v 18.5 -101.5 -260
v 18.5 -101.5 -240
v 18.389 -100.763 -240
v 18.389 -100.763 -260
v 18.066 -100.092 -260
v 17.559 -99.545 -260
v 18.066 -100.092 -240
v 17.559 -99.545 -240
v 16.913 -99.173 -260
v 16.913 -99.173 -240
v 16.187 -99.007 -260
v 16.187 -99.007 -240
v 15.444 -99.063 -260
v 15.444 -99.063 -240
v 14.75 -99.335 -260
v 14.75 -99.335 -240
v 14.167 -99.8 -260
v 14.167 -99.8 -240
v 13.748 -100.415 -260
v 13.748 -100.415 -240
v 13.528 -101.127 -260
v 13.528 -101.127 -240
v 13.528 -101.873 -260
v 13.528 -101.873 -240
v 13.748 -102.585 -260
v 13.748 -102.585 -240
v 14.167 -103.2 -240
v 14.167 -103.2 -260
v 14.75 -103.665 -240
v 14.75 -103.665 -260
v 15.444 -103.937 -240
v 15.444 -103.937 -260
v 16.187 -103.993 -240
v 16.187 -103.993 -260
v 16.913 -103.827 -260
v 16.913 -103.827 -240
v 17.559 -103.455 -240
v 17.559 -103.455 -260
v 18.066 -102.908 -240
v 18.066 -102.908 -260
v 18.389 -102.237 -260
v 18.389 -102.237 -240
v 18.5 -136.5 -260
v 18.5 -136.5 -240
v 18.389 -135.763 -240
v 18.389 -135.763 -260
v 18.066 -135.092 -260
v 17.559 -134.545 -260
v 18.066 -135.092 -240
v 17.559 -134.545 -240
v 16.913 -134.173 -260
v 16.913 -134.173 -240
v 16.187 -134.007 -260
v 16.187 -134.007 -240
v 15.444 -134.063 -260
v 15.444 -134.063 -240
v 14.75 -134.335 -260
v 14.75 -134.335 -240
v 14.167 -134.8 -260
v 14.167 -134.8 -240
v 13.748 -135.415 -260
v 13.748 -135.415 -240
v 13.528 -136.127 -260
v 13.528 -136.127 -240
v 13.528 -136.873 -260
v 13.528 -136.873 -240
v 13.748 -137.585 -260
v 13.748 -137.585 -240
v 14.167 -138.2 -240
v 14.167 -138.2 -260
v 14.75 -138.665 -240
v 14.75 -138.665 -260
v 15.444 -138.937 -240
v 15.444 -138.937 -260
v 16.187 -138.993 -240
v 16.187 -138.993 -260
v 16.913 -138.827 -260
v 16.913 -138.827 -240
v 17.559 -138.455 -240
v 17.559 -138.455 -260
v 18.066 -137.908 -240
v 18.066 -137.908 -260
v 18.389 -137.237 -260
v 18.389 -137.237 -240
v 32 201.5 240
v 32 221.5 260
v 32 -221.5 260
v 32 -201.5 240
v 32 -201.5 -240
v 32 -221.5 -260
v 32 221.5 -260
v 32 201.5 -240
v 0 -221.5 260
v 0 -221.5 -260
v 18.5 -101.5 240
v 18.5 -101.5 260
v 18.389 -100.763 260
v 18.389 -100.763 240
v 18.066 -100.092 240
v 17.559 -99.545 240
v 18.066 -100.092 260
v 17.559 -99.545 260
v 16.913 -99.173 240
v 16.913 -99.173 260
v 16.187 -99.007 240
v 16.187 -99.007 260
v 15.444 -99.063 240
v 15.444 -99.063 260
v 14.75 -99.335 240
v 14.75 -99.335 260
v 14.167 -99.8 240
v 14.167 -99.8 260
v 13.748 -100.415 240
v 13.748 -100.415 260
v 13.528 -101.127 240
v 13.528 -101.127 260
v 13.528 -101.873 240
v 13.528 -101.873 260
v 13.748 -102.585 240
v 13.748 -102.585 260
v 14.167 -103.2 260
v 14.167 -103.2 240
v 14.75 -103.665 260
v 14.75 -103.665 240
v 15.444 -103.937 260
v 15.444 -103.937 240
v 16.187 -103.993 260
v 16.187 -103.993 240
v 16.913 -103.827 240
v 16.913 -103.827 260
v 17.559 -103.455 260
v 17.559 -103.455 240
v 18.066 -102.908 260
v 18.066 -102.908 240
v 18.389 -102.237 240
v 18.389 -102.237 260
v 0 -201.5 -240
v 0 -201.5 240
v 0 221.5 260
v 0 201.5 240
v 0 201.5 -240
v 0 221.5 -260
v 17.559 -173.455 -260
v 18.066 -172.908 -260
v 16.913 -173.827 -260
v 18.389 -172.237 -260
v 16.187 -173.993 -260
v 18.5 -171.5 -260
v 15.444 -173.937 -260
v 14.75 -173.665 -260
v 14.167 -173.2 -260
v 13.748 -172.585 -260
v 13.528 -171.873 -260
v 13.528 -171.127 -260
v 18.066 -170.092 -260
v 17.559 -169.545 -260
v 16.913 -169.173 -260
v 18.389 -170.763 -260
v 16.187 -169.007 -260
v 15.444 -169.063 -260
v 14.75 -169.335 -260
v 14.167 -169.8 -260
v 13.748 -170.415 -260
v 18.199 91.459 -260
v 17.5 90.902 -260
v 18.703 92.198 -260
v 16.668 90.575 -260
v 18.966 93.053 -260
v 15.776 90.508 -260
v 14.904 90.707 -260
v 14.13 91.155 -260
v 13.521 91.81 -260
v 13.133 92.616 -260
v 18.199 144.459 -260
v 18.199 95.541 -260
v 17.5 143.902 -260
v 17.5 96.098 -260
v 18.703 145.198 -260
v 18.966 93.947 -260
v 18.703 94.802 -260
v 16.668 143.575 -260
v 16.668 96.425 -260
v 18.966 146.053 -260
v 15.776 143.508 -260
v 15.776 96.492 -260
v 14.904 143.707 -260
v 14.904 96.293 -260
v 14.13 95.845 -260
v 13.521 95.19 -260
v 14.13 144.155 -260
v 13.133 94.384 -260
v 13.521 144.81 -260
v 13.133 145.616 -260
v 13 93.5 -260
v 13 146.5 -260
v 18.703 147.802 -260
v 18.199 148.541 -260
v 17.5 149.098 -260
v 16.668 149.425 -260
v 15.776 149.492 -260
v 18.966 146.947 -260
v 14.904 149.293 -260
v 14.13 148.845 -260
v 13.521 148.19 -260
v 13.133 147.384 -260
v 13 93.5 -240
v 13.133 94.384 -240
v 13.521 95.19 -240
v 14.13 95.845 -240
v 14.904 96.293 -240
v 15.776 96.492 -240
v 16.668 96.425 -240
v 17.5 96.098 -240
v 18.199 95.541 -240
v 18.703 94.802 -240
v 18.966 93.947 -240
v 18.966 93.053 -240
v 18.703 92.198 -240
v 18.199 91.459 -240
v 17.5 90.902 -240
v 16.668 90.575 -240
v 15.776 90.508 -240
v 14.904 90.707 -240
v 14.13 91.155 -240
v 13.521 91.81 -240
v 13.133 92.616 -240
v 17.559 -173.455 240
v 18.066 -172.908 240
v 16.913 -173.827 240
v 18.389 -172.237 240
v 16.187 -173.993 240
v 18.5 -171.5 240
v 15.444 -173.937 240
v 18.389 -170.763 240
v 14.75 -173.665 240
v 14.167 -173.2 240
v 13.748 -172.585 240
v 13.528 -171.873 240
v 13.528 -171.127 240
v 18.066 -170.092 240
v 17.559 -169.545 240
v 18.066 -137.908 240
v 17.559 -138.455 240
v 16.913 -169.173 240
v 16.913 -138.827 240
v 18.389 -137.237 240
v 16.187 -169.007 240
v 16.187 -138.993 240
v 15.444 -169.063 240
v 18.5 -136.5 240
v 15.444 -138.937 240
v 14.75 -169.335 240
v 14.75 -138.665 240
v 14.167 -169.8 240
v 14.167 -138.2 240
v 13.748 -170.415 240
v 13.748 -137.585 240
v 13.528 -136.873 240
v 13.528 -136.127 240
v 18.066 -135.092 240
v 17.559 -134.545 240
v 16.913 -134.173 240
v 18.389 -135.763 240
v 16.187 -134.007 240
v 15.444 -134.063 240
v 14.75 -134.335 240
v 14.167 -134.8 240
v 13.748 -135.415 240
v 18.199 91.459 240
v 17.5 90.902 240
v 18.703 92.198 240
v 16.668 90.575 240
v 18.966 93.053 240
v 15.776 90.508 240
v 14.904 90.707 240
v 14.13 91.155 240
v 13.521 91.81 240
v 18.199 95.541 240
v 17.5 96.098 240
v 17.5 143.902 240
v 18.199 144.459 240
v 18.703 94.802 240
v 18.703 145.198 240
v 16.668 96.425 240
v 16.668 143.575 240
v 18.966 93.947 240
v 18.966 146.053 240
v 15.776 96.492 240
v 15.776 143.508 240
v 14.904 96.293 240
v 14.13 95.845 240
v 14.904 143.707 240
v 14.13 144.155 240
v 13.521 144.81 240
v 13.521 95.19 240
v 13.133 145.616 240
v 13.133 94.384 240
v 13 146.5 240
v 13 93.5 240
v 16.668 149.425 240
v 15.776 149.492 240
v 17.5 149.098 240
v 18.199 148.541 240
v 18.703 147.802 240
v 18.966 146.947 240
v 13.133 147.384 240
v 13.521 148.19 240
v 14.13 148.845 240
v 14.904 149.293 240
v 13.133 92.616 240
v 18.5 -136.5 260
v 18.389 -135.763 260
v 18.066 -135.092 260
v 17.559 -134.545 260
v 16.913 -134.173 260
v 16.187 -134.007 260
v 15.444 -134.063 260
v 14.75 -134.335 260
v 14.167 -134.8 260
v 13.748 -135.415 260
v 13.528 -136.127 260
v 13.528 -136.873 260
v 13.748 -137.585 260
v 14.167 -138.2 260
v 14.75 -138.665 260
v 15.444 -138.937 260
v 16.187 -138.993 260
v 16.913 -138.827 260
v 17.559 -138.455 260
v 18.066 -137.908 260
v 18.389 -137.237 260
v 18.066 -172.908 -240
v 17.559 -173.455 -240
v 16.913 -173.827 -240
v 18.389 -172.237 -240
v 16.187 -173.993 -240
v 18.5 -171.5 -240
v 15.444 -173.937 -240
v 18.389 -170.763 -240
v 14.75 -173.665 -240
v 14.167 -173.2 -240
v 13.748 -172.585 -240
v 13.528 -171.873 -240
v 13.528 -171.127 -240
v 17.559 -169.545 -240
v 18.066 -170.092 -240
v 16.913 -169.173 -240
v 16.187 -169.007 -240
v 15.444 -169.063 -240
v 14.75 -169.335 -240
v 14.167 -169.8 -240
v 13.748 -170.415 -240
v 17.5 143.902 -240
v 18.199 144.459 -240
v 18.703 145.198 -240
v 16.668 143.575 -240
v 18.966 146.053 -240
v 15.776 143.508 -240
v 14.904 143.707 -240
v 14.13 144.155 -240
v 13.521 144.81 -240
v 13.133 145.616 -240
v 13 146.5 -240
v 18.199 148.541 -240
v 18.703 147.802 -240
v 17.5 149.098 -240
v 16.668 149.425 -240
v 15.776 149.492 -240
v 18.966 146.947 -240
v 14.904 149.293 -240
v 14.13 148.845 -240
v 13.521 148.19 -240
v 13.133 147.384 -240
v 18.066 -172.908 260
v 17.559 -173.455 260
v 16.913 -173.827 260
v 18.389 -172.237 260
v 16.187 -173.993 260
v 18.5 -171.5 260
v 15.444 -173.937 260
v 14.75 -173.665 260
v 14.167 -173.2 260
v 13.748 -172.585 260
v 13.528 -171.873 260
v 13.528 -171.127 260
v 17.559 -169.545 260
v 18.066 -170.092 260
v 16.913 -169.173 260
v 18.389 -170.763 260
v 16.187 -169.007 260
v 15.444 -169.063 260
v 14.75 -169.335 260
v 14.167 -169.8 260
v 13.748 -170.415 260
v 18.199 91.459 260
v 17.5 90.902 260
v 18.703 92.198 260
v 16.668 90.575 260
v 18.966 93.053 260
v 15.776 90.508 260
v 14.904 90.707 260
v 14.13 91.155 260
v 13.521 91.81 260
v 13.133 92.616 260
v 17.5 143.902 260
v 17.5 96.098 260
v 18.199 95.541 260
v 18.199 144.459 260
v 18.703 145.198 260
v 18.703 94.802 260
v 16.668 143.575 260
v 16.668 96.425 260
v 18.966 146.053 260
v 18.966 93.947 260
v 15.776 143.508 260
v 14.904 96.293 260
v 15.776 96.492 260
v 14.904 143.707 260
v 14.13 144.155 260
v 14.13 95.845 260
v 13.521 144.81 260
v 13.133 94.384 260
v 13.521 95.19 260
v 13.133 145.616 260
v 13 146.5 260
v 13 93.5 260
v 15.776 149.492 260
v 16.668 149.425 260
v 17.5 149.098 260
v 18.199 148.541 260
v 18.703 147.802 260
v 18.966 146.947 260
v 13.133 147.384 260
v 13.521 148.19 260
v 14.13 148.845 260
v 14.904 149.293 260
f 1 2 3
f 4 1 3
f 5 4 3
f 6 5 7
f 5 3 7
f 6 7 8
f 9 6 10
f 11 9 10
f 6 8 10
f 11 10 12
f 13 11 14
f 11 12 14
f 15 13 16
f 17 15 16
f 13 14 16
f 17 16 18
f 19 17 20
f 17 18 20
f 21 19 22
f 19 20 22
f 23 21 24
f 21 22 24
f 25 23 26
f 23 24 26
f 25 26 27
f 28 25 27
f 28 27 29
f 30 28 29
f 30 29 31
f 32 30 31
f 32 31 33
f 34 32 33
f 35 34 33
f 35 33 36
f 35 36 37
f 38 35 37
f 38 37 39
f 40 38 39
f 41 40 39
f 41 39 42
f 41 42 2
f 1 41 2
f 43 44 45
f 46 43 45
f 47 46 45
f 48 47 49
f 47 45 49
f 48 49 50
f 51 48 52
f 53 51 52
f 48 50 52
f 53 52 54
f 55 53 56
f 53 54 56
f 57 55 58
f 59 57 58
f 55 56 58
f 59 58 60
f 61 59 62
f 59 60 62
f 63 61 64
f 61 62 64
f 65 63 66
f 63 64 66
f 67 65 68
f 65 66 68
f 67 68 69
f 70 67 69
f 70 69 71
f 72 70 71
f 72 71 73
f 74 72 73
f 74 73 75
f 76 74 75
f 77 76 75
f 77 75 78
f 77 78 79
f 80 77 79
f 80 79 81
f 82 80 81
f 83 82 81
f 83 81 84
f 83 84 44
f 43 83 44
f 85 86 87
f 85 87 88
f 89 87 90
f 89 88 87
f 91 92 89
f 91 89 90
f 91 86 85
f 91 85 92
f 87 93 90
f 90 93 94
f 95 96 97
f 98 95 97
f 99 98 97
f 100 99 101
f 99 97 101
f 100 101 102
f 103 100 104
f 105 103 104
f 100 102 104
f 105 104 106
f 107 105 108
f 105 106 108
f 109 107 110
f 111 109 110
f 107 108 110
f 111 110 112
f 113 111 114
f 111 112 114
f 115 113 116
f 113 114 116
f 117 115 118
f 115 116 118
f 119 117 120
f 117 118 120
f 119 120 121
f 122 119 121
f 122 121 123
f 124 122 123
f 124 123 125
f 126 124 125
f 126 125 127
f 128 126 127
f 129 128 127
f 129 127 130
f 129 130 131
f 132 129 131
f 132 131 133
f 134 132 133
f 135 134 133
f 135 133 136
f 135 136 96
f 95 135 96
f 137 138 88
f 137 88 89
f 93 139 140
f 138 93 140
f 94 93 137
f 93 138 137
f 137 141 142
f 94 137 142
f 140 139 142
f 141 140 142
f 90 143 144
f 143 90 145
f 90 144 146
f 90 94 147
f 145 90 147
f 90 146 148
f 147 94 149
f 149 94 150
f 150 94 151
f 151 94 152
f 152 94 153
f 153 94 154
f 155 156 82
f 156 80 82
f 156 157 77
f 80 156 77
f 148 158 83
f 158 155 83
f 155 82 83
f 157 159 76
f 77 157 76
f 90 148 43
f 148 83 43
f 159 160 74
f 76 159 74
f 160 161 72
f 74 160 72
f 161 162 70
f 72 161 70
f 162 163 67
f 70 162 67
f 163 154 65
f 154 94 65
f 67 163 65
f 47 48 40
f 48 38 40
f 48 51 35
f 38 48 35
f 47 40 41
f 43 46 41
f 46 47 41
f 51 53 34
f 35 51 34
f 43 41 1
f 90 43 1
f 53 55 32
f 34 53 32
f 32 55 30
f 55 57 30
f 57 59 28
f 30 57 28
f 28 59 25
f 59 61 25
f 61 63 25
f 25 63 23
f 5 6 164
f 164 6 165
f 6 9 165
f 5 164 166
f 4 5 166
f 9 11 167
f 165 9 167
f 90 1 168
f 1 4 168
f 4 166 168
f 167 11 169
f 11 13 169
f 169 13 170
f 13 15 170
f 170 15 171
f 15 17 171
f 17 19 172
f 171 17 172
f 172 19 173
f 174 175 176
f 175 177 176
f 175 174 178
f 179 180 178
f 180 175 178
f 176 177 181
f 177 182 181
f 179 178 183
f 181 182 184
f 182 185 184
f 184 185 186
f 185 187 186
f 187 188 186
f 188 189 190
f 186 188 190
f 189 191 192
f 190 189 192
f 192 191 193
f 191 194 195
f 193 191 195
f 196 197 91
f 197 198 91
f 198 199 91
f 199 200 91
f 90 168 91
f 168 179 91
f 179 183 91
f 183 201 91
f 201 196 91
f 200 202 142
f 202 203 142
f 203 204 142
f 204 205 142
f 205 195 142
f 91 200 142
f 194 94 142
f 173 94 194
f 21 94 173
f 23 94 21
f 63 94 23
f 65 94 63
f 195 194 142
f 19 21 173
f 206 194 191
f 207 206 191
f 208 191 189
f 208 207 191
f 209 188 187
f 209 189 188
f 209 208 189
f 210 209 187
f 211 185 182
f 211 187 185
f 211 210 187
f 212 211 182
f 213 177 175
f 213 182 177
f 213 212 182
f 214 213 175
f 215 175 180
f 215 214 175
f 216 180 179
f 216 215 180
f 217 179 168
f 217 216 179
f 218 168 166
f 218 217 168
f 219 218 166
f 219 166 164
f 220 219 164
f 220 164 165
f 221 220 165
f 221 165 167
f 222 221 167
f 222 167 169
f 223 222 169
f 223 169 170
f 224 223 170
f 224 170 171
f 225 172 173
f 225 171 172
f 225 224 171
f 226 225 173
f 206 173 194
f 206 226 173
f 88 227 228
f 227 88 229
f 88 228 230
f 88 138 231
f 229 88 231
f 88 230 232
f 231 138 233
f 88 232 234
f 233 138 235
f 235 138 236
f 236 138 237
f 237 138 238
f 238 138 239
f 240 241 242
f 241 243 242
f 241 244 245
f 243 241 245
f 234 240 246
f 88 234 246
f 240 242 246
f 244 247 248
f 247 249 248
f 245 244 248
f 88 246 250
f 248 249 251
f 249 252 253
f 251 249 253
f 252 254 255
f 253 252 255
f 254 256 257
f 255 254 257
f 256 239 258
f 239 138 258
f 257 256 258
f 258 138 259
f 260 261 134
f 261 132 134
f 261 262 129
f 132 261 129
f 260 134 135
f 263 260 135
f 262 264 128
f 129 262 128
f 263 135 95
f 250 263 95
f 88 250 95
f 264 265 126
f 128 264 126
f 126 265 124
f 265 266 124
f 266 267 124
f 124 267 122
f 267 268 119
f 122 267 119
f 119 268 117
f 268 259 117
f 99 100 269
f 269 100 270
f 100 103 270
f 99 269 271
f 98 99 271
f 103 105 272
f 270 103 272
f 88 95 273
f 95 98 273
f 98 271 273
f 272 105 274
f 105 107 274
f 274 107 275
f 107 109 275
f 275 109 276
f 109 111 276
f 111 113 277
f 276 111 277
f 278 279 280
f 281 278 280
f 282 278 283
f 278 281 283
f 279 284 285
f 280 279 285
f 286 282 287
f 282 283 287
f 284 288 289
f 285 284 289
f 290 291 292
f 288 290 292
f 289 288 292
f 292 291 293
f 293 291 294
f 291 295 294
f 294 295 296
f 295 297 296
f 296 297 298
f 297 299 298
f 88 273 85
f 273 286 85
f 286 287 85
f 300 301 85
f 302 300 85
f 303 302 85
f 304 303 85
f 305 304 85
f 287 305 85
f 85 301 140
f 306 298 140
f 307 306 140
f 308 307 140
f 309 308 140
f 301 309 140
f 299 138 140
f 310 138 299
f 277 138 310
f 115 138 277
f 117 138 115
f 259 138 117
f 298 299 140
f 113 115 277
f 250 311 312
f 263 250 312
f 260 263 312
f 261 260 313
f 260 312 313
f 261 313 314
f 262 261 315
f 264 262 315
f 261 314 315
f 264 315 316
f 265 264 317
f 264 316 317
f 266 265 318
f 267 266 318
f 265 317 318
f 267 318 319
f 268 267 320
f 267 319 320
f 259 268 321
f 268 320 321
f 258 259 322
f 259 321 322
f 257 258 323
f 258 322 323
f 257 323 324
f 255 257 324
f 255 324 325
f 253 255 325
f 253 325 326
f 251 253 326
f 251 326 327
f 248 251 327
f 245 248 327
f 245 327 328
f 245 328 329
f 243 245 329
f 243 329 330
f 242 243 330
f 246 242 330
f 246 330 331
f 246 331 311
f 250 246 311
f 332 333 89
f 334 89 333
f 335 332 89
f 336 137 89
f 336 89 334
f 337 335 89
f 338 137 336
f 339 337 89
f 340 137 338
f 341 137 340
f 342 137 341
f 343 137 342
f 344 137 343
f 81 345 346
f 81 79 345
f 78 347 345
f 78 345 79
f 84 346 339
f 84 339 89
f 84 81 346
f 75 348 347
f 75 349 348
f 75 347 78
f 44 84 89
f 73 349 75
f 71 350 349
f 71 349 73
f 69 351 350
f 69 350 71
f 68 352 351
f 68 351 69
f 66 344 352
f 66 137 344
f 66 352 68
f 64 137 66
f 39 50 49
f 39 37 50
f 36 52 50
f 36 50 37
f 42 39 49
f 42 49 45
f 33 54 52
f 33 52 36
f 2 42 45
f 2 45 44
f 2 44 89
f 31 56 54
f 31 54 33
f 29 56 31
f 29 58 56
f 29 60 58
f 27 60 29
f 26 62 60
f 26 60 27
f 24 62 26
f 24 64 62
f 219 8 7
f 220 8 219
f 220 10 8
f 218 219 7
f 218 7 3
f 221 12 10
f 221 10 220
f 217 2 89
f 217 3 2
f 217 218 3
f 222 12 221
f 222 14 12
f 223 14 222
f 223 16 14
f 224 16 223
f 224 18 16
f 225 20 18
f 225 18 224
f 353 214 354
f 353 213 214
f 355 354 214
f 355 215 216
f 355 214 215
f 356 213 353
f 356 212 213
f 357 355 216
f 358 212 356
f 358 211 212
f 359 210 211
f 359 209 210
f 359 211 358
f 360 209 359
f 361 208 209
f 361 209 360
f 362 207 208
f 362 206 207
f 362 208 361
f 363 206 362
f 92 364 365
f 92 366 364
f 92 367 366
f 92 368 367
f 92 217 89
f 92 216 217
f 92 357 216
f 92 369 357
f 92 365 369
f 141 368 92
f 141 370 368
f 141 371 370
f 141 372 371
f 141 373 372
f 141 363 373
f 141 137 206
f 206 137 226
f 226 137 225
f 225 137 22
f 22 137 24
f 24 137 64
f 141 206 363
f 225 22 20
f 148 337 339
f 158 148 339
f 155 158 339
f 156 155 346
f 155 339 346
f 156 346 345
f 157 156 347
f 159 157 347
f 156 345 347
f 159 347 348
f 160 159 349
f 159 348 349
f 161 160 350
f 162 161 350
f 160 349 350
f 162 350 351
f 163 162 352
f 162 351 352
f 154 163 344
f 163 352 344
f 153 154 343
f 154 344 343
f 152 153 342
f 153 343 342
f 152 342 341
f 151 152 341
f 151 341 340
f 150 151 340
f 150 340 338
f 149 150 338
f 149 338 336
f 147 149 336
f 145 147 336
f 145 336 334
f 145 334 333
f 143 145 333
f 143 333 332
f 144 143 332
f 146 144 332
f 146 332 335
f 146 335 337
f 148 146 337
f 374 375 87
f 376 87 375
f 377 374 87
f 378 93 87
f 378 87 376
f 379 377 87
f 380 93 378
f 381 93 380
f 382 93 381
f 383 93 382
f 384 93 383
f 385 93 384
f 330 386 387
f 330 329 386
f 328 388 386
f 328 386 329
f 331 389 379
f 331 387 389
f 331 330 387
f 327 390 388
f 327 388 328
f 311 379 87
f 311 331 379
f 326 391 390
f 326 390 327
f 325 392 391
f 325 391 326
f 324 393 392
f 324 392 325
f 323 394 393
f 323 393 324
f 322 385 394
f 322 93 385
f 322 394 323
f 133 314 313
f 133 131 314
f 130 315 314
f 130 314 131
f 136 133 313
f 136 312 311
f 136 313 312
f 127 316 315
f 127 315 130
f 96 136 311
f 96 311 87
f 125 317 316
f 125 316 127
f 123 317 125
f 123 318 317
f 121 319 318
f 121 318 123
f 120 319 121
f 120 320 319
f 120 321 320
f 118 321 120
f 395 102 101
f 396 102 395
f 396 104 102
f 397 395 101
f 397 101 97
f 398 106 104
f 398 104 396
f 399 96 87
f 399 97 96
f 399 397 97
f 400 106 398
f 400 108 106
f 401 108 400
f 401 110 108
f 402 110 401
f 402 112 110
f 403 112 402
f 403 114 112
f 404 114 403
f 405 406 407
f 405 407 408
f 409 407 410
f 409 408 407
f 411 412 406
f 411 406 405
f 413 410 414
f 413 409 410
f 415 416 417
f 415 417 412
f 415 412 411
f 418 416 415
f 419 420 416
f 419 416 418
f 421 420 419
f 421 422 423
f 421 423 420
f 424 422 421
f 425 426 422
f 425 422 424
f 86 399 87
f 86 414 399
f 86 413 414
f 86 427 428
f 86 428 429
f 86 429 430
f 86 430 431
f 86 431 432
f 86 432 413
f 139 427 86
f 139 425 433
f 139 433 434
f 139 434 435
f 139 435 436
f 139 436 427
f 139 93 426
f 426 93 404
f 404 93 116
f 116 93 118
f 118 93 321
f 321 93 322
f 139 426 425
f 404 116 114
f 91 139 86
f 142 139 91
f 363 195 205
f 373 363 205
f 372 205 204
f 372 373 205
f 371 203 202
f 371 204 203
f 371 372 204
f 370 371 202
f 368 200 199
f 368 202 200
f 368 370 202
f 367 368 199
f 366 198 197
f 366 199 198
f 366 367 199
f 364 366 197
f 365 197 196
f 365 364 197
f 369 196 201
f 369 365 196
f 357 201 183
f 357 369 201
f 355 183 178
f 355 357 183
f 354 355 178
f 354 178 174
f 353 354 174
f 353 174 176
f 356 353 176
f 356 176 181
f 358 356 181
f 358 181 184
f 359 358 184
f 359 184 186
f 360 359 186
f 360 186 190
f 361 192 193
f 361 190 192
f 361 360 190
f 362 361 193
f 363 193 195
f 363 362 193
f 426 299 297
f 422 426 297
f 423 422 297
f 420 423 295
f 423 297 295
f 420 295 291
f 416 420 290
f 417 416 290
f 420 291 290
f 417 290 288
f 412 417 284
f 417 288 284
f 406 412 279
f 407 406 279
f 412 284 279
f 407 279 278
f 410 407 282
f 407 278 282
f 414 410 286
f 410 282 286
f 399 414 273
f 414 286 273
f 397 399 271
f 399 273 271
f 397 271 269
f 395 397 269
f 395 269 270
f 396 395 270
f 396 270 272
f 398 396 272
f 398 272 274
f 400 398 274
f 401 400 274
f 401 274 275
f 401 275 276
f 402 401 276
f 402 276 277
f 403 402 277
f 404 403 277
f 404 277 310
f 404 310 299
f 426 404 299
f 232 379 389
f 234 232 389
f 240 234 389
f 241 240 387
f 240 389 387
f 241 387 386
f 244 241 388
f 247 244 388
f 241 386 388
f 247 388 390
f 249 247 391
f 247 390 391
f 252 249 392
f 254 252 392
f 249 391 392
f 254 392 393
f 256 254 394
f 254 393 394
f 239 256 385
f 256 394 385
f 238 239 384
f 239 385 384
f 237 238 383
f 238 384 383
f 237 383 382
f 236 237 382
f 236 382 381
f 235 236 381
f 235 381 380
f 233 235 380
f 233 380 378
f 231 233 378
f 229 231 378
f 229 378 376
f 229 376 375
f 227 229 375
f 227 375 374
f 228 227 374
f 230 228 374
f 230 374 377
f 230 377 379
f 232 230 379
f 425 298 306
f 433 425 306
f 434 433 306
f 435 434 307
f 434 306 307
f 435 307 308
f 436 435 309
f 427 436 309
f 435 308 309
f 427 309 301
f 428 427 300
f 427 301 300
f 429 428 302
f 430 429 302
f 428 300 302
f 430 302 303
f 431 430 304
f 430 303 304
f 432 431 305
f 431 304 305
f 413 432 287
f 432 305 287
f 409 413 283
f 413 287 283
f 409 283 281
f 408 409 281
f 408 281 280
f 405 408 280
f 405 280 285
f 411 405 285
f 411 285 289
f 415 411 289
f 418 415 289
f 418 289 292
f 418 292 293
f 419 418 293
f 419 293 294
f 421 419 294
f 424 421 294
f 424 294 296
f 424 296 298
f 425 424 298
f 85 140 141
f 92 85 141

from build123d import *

# Parameters (mm, degrees)
SKETCH1_W               = 520
SKETCH1_H               = 443
SKETCH1_W_2             = 480
SKETCH1_H_2             = 403
BOSS_EXTRUDE2_DEPTH     = 32
SKETCH2_R               = 2.5
CUT_EXTRUDE1_DEPTH      = 610
SKETCH3_R               = 3
CUT_EXTRUDE2_DEPTH      = 641
CUT_EXTRUDE2_DEPTH_BACK = 105


with BuildPart() as part:
    # Sketch1 → Boss-Extrude2 (new body)
    with BuildSketch(Plane(origin=(0, 0, 0), x_dir=(0, 0, -1), z_dir=(1, 0, 0))):
        Rectangle(SKETCH1_W, SKETCH1_H)
        Rectangle(SKETCH1_W_2, SKETCH1_H_2, mode=Mode.SUBTRACT)
    extrude(amount=BOSS_EXTRUDE2_DEPTH)

    # Sketch2 → Cut-Extrude1 (cut)
    with BuildSketch(Plane.XY.offset(260)):
        with Locations((16, -171.5)):
            Circle(SKETCH2_R)
        with Locations((16, -136.5)):
            Circle(SKETCH2_R)
        with Locations((16, -101.5)):
            Circle(SKETCH2_R)
    extrude(amount=-CUT_EXTRUDE1_DEPTH, mode=Mode.SUBTRACT)

    # Sketch3 → Cut-Extrude2 (cut, two sides)
    with BuildSketch(Plane(origin=(0, 0, 240), x_dir=(-1, 0, 0), z_dir=(0, 0, -1))) as cut_extrude2_sk:
        with Locations((-16, 146.5)):
            Circle(SKETCH3_R)
        with Locations((-16, 93.5)):
            Circle(SKETCH3_R)
    extrude(amount=CUT_EXTRUDE2_DEPTH, mode=Mode.SUBTRACT)
    extrude(cut_extrude2_sk.sketch, amount=-CUT_EXTRUDE2_DEPTH_BACK, mode=Mode.SUBTRACT)


solid = part.part
